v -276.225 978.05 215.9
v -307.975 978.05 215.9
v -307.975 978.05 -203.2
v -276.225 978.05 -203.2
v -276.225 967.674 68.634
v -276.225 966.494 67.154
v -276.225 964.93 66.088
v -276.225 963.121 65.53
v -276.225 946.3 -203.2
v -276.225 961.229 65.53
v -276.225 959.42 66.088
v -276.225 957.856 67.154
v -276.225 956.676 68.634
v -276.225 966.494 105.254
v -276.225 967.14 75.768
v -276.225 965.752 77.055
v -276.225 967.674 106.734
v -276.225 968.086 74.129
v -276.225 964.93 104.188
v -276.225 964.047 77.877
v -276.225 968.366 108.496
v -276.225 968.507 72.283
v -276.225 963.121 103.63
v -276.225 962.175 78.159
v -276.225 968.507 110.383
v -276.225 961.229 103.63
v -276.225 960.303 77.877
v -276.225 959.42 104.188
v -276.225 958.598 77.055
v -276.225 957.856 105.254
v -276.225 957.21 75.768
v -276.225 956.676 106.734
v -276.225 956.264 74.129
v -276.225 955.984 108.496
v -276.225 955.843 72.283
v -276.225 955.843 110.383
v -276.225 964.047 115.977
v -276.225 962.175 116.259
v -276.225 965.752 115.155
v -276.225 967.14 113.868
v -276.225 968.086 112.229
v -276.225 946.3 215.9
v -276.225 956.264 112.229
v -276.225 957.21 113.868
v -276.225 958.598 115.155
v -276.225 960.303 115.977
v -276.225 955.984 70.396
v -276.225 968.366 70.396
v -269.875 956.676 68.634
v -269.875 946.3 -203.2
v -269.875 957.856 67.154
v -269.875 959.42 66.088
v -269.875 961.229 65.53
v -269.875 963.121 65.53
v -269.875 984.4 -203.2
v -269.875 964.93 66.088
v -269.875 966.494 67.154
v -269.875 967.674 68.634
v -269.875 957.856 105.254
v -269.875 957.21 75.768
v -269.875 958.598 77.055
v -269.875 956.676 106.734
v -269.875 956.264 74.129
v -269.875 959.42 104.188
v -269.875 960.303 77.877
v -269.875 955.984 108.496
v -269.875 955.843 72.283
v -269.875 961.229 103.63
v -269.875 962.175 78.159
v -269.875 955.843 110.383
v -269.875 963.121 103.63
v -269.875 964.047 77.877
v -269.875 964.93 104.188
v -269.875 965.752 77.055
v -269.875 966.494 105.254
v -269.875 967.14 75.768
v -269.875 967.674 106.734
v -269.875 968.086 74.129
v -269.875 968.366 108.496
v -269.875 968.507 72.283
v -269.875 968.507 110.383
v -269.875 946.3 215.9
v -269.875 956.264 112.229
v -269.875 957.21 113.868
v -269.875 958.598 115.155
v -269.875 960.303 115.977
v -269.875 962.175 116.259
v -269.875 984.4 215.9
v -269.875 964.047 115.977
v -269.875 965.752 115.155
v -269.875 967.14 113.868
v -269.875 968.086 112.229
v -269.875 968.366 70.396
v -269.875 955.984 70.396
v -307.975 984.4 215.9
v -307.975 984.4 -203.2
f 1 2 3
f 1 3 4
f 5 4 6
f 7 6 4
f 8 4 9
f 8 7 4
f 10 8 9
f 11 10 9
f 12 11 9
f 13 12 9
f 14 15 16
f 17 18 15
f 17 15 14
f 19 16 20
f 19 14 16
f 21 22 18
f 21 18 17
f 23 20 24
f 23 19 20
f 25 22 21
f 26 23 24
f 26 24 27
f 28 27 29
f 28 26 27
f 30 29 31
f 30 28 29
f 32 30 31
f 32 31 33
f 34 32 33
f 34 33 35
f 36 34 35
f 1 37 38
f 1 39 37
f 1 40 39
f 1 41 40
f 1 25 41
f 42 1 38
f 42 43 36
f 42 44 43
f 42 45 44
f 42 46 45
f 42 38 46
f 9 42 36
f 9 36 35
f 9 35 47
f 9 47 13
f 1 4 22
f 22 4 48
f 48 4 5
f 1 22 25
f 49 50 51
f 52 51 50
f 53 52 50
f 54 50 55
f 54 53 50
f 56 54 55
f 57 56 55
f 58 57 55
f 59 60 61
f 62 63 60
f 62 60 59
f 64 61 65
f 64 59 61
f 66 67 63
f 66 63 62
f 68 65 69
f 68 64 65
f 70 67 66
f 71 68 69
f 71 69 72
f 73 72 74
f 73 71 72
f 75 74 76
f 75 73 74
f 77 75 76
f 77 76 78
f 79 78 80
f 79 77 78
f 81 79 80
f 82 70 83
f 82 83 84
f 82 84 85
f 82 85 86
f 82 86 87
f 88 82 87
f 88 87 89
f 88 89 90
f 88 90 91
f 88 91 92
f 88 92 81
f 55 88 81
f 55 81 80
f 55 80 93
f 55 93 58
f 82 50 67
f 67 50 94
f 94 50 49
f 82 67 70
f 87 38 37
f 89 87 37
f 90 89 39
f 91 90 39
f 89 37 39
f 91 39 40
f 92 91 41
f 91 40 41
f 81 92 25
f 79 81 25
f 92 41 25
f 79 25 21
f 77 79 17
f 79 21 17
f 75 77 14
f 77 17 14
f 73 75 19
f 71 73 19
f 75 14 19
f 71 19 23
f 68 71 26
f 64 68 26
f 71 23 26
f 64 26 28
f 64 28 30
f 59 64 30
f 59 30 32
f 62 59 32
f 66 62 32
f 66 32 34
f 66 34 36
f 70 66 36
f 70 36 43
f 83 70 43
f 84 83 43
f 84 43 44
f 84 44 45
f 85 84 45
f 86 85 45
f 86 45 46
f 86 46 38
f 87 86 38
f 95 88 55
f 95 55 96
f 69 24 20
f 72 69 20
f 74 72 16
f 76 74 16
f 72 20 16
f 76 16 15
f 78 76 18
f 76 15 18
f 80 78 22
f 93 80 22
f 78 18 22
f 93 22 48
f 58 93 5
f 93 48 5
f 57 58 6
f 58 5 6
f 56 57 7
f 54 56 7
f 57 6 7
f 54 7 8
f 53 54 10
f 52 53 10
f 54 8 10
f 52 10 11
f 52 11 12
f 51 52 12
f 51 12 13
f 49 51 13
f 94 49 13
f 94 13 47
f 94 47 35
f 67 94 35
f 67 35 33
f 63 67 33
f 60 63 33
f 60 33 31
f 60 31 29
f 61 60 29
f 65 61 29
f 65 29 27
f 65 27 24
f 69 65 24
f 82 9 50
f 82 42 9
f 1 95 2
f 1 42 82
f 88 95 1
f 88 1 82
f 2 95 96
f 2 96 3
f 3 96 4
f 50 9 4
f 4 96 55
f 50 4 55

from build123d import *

# Parameters (mm, degrees)
EXTRUDE_THIN1_DEPTH      = 215.9
EXTRUDE_THIN1_DEPTH_BACK = 203.2
SKETCH2_R                = 6.35
CUT_EXTRUDE1_DEPTH       = 7.35


with BuildPart() as part:
    # Sketch1 → Extrude-Thin1 (new body, two sides)
    with BuildSketch(Plane.XY) as extrude_thin1_sk:
        Polygon((-269.875, 946.3), (-269.875, 984.4), (-307.975, 984.4), (-307.975, 978.05), (-276.225, 978.05), (-276.225, 946.3), align=None)
    extrude(amount=EXTRUDE_THIN1_DEPTH)
    extrude(extrude_thin1_sk.sketch, amount=-EXTRUDE_THIN1_DEPTH_BACK)

    # Sketch2 → Cut-Extrude1 (cut, through all)
    with BuildSketch(Plane.ZY.offset(276.225)):
        with Locations((109.908874461, 962.175)):
            Circle(SKETCH2_R)
        with Locations((71.808874461, 962.175)):
            Circle(SKETCH2_R)
    extrude(amount=-CUT_EXTRUDE1_DEPTH, mode=Mode.SUBTRACT)


solid = part.part
